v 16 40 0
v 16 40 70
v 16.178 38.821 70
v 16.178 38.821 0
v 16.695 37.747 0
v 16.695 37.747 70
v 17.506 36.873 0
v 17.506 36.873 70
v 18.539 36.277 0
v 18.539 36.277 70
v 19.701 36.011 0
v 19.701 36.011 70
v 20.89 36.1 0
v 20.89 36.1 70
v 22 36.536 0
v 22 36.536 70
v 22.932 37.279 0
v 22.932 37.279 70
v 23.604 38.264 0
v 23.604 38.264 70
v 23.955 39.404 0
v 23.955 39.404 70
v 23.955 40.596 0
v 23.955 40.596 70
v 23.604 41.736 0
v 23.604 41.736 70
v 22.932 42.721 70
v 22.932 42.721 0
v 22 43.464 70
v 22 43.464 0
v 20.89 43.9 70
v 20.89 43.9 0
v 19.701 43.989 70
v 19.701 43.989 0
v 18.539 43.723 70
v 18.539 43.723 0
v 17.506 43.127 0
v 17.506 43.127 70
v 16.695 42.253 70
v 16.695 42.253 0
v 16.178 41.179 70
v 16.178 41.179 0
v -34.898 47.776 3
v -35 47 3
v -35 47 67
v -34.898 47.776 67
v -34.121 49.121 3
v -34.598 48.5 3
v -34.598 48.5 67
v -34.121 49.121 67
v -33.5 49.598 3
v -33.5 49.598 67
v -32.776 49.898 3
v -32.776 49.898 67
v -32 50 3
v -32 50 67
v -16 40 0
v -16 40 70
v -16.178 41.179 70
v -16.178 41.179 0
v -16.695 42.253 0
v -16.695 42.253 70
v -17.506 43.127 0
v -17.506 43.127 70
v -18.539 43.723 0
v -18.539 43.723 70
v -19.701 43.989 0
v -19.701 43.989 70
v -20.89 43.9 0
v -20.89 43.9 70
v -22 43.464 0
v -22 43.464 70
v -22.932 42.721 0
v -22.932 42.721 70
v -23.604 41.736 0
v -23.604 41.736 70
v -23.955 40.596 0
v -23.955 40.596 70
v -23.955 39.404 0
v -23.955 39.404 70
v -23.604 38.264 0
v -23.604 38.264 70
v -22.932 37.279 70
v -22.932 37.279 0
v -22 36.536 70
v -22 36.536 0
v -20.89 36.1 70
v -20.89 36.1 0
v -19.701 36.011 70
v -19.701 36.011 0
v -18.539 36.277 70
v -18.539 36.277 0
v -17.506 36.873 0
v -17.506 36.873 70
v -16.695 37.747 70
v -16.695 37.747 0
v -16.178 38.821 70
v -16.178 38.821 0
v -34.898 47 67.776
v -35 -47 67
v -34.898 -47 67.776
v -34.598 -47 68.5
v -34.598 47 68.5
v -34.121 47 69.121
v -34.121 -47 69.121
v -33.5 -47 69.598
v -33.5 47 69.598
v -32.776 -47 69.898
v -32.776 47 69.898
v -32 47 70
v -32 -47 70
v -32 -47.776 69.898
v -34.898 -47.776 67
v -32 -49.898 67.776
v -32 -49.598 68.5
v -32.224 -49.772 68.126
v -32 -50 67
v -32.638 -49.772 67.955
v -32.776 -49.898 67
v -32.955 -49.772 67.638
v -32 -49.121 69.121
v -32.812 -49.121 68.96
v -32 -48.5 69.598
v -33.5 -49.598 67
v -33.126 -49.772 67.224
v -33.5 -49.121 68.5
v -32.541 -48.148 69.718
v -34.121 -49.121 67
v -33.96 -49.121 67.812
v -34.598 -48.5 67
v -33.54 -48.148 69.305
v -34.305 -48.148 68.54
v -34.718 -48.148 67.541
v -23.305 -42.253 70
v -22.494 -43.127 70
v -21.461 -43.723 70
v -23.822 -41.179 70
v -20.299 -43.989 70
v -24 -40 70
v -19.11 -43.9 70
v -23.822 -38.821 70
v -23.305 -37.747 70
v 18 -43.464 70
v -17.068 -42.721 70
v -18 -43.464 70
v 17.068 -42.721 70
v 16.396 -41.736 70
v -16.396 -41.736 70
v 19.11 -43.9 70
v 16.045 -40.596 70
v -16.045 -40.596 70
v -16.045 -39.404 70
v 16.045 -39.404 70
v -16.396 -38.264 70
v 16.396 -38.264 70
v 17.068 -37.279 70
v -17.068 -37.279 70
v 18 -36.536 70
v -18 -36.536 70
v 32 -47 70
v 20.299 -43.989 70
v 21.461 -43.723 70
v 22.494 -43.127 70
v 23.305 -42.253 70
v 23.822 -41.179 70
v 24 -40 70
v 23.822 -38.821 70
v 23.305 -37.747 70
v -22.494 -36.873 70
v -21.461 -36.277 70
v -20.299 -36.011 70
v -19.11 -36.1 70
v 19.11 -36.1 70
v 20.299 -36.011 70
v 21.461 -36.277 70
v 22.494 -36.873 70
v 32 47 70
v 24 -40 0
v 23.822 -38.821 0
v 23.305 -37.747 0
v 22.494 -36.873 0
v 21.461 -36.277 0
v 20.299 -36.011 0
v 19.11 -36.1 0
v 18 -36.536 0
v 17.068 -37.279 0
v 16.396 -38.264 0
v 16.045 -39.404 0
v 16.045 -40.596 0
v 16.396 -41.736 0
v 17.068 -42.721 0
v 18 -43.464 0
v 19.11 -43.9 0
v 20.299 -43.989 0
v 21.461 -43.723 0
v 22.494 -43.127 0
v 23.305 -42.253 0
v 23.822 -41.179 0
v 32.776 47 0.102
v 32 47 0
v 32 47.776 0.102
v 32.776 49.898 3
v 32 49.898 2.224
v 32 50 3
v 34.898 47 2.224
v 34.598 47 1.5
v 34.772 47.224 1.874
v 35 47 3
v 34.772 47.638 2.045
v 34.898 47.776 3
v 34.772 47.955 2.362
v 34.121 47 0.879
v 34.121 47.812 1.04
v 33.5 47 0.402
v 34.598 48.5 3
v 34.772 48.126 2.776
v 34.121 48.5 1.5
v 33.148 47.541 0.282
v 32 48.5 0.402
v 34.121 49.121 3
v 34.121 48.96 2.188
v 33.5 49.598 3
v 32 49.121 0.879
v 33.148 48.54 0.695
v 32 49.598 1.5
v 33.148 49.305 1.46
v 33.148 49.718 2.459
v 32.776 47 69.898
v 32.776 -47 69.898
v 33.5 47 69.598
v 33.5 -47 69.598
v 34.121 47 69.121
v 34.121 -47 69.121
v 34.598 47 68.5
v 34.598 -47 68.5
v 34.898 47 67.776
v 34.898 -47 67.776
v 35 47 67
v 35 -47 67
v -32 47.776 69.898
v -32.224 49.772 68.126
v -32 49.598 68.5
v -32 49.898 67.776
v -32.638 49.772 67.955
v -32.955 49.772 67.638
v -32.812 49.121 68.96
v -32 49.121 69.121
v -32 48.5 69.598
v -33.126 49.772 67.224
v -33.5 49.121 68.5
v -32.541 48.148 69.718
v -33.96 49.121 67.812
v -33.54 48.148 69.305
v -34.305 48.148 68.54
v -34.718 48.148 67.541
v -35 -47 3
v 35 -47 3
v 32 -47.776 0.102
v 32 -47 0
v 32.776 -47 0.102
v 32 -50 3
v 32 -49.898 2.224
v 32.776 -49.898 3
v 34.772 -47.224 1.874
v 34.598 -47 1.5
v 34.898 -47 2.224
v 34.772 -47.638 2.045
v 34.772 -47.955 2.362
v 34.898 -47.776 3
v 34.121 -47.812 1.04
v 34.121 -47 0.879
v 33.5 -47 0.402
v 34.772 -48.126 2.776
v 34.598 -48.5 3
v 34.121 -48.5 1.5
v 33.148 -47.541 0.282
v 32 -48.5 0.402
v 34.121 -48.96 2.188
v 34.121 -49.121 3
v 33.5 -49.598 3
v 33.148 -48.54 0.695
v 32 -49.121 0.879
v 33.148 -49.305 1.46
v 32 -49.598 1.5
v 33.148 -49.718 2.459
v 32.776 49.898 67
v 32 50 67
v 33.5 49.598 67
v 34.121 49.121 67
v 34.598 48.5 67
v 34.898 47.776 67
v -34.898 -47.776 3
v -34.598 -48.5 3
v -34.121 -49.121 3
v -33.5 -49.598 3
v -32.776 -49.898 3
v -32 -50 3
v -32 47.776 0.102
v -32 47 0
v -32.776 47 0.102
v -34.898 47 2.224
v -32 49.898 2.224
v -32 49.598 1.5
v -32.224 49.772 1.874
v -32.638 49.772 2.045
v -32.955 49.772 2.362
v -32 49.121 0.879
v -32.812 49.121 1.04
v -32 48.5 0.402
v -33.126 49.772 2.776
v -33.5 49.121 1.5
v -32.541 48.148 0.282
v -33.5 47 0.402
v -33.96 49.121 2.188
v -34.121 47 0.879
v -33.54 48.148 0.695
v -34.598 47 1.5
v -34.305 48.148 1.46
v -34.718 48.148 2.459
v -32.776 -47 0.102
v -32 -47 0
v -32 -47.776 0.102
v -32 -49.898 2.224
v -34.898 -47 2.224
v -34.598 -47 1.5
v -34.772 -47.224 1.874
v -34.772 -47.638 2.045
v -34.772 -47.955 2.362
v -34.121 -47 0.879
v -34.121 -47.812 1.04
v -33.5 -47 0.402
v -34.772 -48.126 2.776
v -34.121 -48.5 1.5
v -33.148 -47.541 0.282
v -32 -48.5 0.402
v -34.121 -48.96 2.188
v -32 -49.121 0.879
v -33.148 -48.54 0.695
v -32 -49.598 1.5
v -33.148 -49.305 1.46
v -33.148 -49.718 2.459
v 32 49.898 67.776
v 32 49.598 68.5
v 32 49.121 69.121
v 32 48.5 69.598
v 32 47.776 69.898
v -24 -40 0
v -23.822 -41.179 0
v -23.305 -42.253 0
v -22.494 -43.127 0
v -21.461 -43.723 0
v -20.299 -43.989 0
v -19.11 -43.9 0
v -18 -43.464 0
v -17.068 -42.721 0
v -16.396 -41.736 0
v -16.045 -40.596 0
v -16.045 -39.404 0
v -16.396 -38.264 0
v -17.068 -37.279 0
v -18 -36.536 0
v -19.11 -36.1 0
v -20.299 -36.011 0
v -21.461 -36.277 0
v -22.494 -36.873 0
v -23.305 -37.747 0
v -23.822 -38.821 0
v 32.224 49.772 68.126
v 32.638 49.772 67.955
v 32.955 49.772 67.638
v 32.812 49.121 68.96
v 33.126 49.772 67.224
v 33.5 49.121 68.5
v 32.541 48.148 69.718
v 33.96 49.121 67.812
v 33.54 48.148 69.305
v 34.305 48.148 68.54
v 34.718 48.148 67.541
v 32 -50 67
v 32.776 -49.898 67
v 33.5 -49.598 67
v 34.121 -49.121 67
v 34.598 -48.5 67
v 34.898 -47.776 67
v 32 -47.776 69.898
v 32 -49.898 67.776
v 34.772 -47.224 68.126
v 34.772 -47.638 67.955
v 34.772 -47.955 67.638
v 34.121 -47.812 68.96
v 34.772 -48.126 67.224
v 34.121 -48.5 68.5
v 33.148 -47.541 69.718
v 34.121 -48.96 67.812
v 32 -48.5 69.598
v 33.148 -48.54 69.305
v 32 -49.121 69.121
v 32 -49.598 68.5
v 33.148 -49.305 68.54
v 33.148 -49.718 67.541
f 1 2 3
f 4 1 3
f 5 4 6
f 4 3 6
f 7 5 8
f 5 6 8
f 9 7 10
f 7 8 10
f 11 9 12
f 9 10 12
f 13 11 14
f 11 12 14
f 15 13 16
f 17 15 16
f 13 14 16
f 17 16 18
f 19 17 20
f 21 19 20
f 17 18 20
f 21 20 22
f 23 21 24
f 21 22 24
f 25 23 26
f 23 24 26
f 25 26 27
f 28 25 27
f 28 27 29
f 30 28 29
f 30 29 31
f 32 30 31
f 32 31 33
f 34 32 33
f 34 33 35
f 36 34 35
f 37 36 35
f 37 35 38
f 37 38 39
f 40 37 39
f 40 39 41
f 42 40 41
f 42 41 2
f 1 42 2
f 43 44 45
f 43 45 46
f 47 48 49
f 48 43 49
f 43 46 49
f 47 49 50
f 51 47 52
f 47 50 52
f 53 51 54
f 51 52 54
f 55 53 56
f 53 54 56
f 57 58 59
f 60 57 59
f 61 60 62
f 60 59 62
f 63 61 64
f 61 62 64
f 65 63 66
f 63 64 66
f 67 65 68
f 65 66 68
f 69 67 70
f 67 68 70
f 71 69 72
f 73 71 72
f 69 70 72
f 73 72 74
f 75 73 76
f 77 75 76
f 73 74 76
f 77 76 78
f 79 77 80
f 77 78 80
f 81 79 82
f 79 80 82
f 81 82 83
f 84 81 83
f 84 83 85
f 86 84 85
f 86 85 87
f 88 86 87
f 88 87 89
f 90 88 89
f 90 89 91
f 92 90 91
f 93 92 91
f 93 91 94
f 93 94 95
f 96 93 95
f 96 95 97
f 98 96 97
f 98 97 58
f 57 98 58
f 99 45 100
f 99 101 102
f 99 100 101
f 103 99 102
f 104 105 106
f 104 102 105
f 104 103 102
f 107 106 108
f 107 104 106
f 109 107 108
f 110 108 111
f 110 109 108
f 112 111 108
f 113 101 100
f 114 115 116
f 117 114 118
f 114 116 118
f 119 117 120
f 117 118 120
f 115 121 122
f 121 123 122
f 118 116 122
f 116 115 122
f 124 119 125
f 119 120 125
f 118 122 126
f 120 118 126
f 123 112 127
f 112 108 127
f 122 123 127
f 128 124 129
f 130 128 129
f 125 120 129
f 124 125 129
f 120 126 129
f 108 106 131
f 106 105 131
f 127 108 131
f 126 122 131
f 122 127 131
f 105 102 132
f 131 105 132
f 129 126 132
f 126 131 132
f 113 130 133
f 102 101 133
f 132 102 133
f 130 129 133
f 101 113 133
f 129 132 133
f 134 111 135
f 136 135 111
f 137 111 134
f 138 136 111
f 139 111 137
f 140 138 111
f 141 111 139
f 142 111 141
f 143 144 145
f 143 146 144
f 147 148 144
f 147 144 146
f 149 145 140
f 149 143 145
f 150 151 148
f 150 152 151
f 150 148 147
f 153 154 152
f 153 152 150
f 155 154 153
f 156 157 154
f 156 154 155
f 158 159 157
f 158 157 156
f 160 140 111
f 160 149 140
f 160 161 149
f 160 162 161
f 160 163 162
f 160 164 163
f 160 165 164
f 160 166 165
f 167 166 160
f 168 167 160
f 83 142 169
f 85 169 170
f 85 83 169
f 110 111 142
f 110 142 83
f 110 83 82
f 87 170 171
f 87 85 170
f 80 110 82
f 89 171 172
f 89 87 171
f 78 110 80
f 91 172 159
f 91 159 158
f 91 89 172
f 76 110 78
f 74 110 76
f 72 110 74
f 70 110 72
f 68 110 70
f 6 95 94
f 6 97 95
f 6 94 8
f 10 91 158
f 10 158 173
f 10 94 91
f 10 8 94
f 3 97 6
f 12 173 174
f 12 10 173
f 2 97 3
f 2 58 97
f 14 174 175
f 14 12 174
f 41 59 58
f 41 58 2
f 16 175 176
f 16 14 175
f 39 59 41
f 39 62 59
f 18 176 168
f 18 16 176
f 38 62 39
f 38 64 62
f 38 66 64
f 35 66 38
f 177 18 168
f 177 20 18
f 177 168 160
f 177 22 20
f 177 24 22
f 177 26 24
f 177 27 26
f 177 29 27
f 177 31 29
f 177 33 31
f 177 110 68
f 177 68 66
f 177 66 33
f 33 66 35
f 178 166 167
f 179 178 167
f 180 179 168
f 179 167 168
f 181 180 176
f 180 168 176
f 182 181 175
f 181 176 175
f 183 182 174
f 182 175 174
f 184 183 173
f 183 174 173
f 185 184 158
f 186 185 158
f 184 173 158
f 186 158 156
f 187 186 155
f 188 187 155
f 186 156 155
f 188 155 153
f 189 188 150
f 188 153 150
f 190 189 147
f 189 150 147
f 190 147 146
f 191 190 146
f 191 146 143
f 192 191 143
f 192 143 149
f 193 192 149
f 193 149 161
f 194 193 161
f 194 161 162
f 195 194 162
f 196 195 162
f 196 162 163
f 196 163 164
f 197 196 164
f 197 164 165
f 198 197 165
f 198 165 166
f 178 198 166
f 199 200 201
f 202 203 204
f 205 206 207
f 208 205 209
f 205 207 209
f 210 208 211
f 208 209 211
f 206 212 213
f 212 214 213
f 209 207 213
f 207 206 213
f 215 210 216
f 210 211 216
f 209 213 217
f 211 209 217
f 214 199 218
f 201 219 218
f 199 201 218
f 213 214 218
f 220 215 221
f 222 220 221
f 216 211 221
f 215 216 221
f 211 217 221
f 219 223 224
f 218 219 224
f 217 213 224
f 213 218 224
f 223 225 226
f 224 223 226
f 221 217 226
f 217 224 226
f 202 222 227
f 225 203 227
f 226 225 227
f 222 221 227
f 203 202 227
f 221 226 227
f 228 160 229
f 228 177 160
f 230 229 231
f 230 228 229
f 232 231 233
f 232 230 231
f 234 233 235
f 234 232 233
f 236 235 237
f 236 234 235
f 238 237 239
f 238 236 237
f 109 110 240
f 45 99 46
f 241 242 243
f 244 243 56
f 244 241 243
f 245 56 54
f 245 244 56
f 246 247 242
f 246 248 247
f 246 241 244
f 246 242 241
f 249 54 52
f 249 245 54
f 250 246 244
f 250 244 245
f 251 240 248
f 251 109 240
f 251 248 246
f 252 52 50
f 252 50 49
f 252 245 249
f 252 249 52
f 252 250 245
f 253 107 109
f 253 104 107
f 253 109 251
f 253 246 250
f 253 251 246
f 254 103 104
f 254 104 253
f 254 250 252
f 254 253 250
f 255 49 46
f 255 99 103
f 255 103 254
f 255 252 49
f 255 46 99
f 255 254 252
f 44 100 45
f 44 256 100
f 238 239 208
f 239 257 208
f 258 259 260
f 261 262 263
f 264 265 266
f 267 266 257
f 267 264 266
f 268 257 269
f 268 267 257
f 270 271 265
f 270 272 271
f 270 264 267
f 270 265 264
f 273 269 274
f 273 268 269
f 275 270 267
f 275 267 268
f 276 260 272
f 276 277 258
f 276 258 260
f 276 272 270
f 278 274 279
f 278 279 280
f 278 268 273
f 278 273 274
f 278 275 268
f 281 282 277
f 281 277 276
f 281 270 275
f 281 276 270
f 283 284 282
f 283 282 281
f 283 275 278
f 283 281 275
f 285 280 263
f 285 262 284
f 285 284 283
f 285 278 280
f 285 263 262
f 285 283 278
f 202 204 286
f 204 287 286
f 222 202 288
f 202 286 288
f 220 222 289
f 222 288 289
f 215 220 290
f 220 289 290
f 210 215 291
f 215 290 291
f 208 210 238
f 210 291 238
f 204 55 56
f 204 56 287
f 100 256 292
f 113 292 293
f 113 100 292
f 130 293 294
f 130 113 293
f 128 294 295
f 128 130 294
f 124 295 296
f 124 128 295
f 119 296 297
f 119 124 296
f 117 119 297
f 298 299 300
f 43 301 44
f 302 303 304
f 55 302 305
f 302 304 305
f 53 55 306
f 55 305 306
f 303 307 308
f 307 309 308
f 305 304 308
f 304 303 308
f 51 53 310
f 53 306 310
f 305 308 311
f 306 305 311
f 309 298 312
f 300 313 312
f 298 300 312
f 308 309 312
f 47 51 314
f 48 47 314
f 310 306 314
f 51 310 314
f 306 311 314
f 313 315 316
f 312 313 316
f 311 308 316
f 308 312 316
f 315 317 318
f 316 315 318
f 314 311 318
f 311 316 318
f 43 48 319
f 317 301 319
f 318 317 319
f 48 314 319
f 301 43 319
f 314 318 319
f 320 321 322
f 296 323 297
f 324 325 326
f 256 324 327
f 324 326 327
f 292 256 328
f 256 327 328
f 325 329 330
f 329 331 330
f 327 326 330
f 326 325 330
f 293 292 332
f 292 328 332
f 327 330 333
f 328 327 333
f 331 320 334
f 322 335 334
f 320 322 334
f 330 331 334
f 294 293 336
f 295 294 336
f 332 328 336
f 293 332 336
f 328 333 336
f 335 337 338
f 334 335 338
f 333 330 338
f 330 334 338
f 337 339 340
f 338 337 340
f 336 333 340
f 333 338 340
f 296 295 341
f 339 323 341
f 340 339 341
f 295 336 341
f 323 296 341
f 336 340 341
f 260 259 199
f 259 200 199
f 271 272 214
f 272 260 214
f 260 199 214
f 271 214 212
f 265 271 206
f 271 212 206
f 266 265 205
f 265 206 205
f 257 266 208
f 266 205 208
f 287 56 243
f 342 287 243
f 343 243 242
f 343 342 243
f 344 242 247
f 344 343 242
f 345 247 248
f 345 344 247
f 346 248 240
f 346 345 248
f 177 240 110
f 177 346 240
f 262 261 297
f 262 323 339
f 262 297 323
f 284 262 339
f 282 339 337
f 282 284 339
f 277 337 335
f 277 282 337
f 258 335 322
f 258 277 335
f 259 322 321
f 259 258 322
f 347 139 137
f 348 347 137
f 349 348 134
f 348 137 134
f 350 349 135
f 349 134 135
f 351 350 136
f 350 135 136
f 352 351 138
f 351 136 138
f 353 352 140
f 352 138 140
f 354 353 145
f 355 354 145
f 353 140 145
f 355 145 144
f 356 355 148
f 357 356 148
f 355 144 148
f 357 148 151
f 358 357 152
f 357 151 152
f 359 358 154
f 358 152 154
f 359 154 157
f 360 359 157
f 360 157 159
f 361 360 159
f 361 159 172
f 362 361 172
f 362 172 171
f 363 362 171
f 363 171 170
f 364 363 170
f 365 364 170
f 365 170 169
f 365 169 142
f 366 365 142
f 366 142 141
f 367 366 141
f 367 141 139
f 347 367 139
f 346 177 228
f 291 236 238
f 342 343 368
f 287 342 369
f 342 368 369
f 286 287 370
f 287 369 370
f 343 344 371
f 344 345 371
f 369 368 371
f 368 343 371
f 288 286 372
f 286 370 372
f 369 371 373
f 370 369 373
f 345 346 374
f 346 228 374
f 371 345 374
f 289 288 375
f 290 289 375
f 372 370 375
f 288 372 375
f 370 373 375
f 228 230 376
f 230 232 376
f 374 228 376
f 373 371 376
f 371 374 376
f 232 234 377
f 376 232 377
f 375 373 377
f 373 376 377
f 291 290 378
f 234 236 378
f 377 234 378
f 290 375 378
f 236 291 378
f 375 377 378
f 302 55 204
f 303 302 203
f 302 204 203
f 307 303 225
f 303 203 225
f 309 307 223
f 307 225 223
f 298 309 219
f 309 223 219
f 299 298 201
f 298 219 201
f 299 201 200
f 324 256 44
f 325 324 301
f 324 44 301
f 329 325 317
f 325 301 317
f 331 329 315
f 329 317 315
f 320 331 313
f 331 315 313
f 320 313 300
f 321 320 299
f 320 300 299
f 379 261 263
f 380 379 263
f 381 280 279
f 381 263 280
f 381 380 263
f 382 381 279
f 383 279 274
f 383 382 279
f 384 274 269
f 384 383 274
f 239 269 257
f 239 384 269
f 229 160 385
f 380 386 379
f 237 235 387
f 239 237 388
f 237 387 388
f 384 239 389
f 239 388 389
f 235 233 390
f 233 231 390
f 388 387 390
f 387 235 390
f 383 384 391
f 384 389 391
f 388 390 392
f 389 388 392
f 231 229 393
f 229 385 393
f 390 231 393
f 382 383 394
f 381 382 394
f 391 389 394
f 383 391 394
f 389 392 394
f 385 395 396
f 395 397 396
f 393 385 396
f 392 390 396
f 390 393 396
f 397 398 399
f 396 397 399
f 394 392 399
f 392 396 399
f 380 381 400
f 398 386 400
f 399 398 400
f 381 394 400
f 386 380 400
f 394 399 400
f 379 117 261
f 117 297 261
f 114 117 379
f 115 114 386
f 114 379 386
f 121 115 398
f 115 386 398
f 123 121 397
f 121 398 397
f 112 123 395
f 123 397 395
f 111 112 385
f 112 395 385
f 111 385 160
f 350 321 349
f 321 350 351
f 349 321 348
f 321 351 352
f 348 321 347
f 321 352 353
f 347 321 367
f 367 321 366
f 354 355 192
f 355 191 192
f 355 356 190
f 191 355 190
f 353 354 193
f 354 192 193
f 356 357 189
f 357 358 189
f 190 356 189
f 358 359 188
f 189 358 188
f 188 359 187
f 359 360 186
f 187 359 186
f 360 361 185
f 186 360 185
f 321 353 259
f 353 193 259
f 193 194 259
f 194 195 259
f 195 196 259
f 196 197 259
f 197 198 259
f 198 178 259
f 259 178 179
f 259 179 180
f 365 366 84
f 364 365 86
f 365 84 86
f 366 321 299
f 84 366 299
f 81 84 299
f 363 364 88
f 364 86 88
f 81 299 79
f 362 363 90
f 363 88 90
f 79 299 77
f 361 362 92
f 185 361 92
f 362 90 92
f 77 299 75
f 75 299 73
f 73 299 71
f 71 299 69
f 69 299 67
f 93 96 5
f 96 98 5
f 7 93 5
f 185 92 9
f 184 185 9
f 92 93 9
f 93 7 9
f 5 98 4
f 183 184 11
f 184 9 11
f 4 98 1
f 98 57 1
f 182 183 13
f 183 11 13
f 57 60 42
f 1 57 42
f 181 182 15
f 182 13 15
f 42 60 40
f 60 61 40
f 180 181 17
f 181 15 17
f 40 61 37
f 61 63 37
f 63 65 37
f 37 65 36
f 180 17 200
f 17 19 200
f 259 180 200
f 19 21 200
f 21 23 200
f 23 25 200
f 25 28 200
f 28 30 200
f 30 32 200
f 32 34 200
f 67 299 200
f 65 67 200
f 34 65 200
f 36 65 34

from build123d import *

# Parameters (mm, degrees)
SKETCH1_W           = 70
SKETCH1_H           = 100
BOSS_EXTRUDE1_DEPTH = 70
SKETCH2_R           = 4
CUT_EXTRUDE1_DEPTH  = 93.870878105
FILLET1_R           = 3


with BuildPart() as part:
    # Sketch1 → Boss-Extrude1 (new body)
    with BuildSketch(Plane.XY):
        Rectangle(SKETCH1_W, SKETCH1_H)
    extrude(amount=BOSS_EXTRUDE1_DEPTH)

    # Sketch2 → Cut-Extrude1 (cut, through all)
    with BuildSketch(Plane.XY.offset(70)):
        with Locations((-20, 40)):
            Circle(SKETCH2_R)
        with Locations(Location((-20, -40, 0), (0, 0, 180))):
            Circle(SKETCH2_R)
        with Locations((20, -40)):
            Circle(SKETCH2_R)
        with Locations(Location((20, 40, 0), (0, 0, 180))):
            Circle(SKETCH2_R)
    extrude(amount=-CUT_EXTRUDE1_DEPTH, mode=Mode.SUBTRACT)

    # Fillet1
    fillet1_edges = [part.edges().sort_by_distance(p)[0] for p in [
        (-35, 0, 70),
        (0, -50, 70),
        (35, 0, 70),
        (0, -50, 0),
        (-35, 0, 0),
        (0, 50, 0),
        (35, 0, 0),
        (0, 50, 70),
        (35, -50, 35),
        (-35, -50, 35),
        (-35, 50, 35),
        (35, 50, 35),
    ]]
    fillet(fillet1_edges, radius=FILLET1_R)


solid = part.part
